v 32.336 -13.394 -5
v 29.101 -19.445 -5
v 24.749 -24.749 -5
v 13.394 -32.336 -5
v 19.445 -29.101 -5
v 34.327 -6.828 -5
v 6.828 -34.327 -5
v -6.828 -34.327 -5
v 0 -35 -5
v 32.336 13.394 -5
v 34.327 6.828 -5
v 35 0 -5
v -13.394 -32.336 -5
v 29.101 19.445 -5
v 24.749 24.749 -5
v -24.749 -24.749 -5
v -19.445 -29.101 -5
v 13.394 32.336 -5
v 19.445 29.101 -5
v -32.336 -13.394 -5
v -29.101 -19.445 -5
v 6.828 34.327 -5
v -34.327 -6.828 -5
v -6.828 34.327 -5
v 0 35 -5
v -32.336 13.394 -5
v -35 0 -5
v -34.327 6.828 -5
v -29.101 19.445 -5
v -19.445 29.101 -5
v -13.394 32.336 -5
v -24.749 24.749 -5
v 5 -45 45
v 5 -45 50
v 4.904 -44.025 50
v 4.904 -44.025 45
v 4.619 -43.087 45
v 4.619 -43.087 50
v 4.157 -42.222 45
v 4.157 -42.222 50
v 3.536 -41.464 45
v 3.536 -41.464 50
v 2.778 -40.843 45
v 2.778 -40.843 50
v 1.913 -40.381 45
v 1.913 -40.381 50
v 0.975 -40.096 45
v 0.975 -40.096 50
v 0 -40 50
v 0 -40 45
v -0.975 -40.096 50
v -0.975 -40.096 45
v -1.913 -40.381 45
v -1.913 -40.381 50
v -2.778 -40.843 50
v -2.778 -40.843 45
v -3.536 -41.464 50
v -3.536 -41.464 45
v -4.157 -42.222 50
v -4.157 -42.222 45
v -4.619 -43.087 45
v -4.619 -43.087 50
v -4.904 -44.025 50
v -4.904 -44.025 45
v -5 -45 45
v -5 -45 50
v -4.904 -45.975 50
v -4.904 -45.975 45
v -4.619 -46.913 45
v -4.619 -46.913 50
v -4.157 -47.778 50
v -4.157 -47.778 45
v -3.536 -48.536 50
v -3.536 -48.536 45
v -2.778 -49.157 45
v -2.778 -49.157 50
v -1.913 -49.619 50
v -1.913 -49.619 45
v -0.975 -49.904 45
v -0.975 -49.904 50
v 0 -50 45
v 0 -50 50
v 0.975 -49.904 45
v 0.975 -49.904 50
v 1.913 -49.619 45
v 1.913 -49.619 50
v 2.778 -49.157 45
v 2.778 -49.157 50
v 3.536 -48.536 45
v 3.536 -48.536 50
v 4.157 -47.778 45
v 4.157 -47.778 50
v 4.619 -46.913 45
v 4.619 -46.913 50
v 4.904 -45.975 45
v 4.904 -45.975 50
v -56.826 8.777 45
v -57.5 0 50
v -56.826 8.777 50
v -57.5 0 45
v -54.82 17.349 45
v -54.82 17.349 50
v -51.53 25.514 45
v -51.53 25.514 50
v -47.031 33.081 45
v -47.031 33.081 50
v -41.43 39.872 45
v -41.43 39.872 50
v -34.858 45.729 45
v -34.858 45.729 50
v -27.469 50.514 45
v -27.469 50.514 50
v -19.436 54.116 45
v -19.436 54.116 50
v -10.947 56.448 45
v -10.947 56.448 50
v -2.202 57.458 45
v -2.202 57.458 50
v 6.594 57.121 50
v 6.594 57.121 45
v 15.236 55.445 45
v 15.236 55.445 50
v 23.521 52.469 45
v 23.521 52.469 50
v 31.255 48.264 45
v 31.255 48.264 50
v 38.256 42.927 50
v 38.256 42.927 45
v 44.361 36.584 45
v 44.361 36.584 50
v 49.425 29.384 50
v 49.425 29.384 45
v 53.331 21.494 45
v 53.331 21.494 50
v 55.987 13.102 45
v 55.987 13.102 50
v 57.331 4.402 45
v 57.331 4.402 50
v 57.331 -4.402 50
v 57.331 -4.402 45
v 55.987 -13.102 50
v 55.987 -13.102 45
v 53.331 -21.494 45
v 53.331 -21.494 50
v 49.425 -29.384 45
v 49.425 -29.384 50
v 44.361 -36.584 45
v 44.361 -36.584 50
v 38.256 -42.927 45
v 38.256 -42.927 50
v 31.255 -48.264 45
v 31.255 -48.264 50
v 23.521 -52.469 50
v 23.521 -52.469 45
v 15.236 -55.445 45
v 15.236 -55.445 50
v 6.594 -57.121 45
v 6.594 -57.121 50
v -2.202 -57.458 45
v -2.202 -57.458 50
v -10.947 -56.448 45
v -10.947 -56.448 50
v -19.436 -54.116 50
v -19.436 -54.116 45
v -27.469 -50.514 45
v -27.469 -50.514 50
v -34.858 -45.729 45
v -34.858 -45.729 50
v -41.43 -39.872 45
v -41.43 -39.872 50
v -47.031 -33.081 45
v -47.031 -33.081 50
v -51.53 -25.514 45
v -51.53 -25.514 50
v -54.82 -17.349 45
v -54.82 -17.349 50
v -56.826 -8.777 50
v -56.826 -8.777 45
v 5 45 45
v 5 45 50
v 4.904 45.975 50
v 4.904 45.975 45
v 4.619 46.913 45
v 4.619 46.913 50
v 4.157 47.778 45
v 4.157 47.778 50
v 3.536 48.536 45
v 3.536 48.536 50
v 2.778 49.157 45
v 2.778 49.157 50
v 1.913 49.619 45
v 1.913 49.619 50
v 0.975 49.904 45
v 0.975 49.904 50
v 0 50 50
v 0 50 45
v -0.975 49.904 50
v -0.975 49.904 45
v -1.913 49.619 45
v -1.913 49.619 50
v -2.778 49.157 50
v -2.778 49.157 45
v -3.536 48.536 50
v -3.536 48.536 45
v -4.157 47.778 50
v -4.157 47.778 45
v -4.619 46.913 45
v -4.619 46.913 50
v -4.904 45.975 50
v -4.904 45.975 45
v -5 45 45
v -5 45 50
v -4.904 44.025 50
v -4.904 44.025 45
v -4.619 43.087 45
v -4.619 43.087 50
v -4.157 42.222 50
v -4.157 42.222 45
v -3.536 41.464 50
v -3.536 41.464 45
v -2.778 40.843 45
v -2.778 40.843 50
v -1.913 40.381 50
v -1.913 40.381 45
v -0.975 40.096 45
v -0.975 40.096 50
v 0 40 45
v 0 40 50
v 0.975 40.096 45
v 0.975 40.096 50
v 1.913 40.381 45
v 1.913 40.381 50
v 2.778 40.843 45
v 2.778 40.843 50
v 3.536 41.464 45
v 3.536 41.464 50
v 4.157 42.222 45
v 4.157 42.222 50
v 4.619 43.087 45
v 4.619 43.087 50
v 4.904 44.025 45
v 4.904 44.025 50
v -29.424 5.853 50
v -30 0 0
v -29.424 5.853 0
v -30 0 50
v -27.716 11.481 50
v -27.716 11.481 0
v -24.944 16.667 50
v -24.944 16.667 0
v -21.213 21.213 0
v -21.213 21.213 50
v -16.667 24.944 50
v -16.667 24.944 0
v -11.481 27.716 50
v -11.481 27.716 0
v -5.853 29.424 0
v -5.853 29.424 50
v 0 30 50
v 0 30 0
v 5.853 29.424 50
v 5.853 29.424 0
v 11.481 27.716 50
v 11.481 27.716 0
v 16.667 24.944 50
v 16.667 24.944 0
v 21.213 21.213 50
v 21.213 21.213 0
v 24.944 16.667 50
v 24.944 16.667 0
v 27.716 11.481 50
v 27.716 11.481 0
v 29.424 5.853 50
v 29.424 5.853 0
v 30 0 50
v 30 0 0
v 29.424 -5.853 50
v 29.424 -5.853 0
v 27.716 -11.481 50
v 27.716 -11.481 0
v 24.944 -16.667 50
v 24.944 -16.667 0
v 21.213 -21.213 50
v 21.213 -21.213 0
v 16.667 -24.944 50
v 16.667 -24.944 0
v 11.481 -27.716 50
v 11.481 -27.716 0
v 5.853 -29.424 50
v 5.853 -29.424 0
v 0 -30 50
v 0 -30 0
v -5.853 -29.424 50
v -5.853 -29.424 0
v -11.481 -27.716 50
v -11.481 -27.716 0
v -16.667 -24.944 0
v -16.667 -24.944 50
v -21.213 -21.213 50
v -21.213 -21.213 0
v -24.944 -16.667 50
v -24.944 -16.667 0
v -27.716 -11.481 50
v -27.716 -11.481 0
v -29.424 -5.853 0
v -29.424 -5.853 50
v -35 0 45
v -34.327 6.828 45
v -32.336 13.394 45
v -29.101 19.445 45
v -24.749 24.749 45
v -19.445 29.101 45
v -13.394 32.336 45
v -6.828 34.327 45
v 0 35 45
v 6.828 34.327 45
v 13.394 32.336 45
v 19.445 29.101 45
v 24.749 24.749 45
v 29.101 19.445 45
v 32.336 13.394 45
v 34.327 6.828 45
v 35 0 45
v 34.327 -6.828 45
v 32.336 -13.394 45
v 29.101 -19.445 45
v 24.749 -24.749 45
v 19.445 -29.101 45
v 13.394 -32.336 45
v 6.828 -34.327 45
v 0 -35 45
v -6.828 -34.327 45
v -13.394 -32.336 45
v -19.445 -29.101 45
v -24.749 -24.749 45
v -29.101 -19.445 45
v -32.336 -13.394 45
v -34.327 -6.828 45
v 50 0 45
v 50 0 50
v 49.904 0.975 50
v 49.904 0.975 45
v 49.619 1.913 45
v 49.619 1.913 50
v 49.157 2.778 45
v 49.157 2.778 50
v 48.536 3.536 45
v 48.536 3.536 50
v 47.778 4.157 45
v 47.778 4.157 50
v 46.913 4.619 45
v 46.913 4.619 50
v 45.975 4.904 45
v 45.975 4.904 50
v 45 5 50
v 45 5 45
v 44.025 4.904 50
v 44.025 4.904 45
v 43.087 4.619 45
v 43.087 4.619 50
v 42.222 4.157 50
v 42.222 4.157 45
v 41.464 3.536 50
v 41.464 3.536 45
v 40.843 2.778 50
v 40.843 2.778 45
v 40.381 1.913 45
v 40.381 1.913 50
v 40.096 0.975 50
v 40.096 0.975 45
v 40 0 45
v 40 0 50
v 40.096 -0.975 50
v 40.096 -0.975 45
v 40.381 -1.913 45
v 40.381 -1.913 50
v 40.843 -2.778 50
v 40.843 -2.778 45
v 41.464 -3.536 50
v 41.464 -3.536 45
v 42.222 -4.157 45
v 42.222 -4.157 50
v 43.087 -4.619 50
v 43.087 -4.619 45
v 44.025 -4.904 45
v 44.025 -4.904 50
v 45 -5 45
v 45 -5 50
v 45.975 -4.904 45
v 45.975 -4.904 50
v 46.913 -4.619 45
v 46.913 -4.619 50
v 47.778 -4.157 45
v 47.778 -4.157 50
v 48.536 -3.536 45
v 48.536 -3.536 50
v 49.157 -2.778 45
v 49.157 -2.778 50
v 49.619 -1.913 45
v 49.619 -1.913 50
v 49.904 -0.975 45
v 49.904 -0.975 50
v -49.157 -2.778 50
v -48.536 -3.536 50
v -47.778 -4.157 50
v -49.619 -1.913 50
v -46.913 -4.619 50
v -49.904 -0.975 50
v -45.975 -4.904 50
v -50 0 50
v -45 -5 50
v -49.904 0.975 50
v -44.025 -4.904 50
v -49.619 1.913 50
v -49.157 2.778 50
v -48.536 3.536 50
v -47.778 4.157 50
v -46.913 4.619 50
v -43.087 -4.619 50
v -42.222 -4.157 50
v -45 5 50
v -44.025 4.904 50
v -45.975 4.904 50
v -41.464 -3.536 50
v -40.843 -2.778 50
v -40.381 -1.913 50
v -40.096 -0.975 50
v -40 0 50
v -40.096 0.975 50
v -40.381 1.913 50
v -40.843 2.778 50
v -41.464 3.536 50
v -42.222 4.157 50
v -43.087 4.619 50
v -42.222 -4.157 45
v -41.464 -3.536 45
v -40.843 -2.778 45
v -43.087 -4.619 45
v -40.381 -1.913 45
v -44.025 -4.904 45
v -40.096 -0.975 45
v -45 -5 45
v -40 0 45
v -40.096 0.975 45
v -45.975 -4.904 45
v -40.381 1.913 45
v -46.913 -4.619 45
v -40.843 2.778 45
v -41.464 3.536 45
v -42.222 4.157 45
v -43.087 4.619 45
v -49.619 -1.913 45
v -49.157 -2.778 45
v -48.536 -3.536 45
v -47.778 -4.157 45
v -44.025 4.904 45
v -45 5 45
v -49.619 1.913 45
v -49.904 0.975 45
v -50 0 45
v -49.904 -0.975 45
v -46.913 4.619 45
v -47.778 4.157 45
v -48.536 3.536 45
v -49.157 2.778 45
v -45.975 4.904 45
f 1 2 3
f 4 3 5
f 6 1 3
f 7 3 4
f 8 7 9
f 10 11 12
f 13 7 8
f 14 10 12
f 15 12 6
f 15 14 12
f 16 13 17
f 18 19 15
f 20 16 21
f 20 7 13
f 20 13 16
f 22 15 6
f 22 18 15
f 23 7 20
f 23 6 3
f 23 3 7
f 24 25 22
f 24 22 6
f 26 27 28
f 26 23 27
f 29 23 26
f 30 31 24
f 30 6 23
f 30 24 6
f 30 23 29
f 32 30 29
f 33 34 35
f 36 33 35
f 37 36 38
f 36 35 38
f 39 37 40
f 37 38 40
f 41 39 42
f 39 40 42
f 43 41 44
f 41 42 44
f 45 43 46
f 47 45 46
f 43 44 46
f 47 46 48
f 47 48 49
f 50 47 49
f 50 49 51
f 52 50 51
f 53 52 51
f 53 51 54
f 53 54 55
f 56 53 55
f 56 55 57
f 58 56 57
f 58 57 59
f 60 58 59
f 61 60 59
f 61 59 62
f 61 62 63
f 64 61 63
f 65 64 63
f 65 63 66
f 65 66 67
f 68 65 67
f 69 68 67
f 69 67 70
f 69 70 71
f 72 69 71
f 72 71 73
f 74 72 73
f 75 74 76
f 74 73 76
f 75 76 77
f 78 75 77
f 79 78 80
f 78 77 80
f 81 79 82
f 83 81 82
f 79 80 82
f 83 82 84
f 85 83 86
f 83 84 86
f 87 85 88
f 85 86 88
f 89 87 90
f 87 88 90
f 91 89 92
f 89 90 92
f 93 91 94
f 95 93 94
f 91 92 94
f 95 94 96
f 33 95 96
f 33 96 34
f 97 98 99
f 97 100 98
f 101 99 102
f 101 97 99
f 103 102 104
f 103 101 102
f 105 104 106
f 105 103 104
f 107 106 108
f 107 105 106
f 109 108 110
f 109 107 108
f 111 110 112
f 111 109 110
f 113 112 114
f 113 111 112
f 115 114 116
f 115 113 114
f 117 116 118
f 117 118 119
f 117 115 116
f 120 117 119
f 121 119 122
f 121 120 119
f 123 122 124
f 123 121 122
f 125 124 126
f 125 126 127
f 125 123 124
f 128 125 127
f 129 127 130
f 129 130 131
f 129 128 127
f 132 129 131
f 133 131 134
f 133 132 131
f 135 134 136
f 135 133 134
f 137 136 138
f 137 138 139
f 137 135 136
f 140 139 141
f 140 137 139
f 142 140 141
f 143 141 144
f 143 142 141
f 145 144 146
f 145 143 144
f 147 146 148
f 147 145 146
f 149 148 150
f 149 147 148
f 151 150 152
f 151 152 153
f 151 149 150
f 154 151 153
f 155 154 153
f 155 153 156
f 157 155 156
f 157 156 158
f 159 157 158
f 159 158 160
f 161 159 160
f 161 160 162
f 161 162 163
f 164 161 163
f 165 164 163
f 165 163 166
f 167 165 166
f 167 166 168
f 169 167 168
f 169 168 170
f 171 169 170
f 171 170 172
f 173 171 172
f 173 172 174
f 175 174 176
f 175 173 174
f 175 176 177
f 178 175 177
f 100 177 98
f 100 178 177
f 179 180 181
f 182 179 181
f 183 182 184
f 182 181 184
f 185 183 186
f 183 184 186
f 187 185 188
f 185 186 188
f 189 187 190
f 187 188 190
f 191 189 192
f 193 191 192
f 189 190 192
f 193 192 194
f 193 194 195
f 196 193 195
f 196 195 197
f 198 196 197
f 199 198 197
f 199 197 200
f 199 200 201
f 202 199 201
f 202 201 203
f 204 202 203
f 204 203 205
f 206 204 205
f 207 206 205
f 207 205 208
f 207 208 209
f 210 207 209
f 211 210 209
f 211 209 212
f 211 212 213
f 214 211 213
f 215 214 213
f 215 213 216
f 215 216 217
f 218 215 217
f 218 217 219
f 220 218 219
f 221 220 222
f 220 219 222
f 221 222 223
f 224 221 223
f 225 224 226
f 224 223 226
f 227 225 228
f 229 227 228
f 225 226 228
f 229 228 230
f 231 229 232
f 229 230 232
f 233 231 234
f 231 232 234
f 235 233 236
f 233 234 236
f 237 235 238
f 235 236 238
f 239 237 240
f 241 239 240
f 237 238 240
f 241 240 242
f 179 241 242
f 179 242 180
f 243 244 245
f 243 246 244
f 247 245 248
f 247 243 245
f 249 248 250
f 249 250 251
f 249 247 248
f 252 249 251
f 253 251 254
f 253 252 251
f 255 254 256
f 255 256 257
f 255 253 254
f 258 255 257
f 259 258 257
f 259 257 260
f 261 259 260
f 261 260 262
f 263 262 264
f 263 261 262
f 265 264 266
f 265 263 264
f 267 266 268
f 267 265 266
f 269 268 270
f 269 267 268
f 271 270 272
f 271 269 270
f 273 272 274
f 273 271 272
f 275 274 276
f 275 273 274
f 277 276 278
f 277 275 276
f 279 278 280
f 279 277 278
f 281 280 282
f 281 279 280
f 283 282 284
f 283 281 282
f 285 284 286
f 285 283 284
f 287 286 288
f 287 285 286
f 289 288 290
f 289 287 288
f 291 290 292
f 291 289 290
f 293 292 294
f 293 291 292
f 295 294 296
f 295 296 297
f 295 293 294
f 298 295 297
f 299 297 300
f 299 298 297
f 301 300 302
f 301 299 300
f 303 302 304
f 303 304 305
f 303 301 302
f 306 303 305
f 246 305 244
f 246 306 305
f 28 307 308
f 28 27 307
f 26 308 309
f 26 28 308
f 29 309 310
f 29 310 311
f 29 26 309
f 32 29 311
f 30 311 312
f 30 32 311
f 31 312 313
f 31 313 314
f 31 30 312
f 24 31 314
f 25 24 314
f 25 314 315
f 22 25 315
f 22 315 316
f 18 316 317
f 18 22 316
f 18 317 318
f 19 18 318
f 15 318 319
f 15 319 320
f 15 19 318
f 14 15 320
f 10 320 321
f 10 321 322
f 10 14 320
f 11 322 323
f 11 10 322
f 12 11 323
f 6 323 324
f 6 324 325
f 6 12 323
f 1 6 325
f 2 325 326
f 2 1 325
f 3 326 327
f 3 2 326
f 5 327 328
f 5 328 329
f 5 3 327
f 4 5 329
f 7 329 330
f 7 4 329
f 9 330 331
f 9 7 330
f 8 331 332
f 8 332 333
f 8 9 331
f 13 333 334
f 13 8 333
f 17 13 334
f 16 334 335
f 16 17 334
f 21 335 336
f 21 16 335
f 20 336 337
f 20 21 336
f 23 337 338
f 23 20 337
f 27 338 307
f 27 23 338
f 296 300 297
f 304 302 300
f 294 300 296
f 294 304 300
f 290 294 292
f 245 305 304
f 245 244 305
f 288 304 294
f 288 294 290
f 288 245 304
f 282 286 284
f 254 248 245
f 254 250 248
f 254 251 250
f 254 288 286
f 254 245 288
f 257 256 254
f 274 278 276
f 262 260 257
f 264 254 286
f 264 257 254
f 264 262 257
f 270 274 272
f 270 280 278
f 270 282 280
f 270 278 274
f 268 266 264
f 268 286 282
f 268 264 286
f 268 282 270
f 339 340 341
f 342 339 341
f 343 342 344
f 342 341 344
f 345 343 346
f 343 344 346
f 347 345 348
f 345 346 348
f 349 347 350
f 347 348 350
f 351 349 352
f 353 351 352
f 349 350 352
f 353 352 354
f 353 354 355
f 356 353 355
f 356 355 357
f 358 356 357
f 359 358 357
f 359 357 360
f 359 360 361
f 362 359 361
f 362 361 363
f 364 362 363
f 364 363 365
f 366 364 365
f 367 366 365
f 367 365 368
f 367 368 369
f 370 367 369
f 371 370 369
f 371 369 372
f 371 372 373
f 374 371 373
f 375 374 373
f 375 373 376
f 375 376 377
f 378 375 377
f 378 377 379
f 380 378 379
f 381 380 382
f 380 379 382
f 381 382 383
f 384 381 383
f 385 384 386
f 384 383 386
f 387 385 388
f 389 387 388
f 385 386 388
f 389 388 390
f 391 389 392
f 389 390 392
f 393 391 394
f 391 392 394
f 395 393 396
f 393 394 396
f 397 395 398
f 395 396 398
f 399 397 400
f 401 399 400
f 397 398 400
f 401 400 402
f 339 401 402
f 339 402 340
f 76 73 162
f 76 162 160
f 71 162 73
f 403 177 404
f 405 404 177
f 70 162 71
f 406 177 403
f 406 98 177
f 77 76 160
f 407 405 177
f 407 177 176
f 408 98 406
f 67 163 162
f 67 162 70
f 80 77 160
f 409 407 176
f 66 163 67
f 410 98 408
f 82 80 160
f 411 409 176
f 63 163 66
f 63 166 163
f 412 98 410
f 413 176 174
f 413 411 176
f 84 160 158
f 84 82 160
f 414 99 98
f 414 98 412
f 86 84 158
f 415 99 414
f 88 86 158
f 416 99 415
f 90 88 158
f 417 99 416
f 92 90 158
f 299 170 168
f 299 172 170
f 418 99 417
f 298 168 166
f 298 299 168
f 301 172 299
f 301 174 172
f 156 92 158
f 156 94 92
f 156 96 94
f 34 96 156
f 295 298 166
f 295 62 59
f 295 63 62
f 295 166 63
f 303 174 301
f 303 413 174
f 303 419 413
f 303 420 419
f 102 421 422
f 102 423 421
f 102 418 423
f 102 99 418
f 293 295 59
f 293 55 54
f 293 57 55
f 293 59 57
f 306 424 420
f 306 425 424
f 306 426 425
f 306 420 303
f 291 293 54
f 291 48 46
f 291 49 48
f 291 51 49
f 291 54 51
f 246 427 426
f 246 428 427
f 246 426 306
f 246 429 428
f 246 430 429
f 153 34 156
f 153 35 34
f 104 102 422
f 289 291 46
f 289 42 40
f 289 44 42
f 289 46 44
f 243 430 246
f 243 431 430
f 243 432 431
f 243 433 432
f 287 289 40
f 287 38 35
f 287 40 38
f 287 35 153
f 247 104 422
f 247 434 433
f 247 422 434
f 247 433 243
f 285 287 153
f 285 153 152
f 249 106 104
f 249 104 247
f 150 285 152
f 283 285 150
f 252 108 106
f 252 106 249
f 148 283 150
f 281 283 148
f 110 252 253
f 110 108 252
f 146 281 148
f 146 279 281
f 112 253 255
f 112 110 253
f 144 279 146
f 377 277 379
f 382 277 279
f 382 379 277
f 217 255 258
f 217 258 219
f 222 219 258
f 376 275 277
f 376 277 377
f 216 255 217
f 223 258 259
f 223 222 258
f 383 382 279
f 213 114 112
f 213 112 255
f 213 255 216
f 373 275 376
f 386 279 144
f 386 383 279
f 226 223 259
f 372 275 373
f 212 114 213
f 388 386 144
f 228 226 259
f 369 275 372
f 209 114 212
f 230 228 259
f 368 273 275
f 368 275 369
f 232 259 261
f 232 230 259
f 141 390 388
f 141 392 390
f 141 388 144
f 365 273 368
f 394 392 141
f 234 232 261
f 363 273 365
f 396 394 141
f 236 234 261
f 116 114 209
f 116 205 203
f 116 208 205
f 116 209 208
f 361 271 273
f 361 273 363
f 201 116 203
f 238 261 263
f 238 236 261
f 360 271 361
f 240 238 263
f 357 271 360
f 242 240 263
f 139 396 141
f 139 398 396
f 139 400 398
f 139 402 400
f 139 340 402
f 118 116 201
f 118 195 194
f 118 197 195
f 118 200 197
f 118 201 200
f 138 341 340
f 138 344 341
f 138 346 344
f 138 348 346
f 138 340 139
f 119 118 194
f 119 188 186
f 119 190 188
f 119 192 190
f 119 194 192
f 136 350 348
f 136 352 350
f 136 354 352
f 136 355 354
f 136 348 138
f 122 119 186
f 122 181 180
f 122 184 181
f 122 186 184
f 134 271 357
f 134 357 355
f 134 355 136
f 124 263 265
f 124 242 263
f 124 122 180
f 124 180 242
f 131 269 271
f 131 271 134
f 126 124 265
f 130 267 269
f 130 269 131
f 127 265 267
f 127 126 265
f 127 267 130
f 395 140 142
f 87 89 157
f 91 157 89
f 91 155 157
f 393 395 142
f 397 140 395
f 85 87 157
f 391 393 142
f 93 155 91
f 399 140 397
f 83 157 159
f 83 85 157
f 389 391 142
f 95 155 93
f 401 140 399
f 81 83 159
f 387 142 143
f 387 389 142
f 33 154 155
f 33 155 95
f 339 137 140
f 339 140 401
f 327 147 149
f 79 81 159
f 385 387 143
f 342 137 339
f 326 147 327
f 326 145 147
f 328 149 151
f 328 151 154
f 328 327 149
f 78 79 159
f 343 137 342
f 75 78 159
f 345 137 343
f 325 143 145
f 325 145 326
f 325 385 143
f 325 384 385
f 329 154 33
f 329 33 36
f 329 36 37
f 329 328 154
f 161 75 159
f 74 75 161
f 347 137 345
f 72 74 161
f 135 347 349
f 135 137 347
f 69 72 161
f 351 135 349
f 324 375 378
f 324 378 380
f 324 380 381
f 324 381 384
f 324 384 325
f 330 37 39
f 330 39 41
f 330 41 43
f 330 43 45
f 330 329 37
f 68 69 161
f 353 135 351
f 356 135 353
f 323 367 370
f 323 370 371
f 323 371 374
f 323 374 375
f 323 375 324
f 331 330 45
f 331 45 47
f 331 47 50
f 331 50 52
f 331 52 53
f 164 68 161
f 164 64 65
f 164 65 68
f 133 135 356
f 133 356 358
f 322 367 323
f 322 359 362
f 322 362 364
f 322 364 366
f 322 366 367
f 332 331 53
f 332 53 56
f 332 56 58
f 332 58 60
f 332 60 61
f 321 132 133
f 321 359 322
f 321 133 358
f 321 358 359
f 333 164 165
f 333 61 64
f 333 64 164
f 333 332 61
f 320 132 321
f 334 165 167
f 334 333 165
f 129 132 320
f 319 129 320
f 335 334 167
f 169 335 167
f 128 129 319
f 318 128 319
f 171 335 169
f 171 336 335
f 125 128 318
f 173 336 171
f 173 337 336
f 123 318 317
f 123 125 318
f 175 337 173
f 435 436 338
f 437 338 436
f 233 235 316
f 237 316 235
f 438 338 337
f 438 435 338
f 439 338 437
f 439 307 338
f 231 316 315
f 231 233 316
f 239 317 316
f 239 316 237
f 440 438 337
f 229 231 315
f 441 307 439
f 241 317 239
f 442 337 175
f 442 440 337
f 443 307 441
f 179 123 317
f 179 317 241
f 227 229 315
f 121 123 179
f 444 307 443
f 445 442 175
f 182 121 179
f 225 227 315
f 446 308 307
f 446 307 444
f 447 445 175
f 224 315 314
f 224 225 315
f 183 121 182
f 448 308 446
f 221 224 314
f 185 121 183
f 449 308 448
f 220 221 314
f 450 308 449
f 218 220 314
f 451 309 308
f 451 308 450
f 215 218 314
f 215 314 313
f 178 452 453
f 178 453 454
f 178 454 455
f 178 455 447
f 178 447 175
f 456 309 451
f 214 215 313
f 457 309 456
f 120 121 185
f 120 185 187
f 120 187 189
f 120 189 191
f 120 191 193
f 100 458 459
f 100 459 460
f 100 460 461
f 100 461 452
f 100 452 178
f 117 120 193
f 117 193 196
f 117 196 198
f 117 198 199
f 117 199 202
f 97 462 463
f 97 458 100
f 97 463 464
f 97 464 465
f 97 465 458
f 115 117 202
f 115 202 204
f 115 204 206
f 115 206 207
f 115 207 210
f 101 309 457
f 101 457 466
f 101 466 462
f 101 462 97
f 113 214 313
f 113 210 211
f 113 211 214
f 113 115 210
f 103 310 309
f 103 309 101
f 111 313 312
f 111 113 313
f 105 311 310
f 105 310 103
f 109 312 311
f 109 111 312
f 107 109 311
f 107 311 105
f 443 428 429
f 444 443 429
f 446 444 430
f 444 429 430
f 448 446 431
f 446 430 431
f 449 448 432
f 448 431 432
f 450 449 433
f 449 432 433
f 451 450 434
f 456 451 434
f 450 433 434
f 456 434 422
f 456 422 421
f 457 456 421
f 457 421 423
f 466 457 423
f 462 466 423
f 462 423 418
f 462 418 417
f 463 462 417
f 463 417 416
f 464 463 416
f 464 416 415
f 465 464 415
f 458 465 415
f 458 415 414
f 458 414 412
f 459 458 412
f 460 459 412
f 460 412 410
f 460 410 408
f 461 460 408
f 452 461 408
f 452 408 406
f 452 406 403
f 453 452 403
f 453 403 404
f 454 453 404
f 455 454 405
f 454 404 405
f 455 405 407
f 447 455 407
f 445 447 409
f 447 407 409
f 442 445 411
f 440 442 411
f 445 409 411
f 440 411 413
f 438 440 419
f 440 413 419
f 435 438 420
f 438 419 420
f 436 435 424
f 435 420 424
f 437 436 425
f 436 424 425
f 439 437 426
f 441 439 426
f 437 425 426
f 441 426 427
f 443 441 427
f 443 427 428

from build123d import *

# Parameters (mm, degrees)
F2_R     = 5
F3_DEPTH = 25


with BuildPart() as f1:
    # F0 (on Front) → F1 (revolve)
    with BuildSketch(Plane.XZ):
        Polygon((-30, 50), (-57.5, 50), (-57.5, 45), (-35, 45), (-35, -5), (0, -5), (0, 0), (-30, 0), align=None)
    revolve(axis=Axis((0, 0, 20.000002), (0, 0, -1)))

    # F2 (on face) → F3 (cut)
    with BuildSketch(Plane.XY.offset(50)):
        with Locations((0, 45)):
            Circle(F2_R)
        with Locations((-45, 0)):
            Circle(F2_R)
        with Locations((0, -45)):
            Circle(F2_R)
        with Locations((45, 0)):
            Circle(F2_R)
    extrude(amount=-F3_DEPTH, mode=Mode.SUBTRACT)


solid = f1.part
